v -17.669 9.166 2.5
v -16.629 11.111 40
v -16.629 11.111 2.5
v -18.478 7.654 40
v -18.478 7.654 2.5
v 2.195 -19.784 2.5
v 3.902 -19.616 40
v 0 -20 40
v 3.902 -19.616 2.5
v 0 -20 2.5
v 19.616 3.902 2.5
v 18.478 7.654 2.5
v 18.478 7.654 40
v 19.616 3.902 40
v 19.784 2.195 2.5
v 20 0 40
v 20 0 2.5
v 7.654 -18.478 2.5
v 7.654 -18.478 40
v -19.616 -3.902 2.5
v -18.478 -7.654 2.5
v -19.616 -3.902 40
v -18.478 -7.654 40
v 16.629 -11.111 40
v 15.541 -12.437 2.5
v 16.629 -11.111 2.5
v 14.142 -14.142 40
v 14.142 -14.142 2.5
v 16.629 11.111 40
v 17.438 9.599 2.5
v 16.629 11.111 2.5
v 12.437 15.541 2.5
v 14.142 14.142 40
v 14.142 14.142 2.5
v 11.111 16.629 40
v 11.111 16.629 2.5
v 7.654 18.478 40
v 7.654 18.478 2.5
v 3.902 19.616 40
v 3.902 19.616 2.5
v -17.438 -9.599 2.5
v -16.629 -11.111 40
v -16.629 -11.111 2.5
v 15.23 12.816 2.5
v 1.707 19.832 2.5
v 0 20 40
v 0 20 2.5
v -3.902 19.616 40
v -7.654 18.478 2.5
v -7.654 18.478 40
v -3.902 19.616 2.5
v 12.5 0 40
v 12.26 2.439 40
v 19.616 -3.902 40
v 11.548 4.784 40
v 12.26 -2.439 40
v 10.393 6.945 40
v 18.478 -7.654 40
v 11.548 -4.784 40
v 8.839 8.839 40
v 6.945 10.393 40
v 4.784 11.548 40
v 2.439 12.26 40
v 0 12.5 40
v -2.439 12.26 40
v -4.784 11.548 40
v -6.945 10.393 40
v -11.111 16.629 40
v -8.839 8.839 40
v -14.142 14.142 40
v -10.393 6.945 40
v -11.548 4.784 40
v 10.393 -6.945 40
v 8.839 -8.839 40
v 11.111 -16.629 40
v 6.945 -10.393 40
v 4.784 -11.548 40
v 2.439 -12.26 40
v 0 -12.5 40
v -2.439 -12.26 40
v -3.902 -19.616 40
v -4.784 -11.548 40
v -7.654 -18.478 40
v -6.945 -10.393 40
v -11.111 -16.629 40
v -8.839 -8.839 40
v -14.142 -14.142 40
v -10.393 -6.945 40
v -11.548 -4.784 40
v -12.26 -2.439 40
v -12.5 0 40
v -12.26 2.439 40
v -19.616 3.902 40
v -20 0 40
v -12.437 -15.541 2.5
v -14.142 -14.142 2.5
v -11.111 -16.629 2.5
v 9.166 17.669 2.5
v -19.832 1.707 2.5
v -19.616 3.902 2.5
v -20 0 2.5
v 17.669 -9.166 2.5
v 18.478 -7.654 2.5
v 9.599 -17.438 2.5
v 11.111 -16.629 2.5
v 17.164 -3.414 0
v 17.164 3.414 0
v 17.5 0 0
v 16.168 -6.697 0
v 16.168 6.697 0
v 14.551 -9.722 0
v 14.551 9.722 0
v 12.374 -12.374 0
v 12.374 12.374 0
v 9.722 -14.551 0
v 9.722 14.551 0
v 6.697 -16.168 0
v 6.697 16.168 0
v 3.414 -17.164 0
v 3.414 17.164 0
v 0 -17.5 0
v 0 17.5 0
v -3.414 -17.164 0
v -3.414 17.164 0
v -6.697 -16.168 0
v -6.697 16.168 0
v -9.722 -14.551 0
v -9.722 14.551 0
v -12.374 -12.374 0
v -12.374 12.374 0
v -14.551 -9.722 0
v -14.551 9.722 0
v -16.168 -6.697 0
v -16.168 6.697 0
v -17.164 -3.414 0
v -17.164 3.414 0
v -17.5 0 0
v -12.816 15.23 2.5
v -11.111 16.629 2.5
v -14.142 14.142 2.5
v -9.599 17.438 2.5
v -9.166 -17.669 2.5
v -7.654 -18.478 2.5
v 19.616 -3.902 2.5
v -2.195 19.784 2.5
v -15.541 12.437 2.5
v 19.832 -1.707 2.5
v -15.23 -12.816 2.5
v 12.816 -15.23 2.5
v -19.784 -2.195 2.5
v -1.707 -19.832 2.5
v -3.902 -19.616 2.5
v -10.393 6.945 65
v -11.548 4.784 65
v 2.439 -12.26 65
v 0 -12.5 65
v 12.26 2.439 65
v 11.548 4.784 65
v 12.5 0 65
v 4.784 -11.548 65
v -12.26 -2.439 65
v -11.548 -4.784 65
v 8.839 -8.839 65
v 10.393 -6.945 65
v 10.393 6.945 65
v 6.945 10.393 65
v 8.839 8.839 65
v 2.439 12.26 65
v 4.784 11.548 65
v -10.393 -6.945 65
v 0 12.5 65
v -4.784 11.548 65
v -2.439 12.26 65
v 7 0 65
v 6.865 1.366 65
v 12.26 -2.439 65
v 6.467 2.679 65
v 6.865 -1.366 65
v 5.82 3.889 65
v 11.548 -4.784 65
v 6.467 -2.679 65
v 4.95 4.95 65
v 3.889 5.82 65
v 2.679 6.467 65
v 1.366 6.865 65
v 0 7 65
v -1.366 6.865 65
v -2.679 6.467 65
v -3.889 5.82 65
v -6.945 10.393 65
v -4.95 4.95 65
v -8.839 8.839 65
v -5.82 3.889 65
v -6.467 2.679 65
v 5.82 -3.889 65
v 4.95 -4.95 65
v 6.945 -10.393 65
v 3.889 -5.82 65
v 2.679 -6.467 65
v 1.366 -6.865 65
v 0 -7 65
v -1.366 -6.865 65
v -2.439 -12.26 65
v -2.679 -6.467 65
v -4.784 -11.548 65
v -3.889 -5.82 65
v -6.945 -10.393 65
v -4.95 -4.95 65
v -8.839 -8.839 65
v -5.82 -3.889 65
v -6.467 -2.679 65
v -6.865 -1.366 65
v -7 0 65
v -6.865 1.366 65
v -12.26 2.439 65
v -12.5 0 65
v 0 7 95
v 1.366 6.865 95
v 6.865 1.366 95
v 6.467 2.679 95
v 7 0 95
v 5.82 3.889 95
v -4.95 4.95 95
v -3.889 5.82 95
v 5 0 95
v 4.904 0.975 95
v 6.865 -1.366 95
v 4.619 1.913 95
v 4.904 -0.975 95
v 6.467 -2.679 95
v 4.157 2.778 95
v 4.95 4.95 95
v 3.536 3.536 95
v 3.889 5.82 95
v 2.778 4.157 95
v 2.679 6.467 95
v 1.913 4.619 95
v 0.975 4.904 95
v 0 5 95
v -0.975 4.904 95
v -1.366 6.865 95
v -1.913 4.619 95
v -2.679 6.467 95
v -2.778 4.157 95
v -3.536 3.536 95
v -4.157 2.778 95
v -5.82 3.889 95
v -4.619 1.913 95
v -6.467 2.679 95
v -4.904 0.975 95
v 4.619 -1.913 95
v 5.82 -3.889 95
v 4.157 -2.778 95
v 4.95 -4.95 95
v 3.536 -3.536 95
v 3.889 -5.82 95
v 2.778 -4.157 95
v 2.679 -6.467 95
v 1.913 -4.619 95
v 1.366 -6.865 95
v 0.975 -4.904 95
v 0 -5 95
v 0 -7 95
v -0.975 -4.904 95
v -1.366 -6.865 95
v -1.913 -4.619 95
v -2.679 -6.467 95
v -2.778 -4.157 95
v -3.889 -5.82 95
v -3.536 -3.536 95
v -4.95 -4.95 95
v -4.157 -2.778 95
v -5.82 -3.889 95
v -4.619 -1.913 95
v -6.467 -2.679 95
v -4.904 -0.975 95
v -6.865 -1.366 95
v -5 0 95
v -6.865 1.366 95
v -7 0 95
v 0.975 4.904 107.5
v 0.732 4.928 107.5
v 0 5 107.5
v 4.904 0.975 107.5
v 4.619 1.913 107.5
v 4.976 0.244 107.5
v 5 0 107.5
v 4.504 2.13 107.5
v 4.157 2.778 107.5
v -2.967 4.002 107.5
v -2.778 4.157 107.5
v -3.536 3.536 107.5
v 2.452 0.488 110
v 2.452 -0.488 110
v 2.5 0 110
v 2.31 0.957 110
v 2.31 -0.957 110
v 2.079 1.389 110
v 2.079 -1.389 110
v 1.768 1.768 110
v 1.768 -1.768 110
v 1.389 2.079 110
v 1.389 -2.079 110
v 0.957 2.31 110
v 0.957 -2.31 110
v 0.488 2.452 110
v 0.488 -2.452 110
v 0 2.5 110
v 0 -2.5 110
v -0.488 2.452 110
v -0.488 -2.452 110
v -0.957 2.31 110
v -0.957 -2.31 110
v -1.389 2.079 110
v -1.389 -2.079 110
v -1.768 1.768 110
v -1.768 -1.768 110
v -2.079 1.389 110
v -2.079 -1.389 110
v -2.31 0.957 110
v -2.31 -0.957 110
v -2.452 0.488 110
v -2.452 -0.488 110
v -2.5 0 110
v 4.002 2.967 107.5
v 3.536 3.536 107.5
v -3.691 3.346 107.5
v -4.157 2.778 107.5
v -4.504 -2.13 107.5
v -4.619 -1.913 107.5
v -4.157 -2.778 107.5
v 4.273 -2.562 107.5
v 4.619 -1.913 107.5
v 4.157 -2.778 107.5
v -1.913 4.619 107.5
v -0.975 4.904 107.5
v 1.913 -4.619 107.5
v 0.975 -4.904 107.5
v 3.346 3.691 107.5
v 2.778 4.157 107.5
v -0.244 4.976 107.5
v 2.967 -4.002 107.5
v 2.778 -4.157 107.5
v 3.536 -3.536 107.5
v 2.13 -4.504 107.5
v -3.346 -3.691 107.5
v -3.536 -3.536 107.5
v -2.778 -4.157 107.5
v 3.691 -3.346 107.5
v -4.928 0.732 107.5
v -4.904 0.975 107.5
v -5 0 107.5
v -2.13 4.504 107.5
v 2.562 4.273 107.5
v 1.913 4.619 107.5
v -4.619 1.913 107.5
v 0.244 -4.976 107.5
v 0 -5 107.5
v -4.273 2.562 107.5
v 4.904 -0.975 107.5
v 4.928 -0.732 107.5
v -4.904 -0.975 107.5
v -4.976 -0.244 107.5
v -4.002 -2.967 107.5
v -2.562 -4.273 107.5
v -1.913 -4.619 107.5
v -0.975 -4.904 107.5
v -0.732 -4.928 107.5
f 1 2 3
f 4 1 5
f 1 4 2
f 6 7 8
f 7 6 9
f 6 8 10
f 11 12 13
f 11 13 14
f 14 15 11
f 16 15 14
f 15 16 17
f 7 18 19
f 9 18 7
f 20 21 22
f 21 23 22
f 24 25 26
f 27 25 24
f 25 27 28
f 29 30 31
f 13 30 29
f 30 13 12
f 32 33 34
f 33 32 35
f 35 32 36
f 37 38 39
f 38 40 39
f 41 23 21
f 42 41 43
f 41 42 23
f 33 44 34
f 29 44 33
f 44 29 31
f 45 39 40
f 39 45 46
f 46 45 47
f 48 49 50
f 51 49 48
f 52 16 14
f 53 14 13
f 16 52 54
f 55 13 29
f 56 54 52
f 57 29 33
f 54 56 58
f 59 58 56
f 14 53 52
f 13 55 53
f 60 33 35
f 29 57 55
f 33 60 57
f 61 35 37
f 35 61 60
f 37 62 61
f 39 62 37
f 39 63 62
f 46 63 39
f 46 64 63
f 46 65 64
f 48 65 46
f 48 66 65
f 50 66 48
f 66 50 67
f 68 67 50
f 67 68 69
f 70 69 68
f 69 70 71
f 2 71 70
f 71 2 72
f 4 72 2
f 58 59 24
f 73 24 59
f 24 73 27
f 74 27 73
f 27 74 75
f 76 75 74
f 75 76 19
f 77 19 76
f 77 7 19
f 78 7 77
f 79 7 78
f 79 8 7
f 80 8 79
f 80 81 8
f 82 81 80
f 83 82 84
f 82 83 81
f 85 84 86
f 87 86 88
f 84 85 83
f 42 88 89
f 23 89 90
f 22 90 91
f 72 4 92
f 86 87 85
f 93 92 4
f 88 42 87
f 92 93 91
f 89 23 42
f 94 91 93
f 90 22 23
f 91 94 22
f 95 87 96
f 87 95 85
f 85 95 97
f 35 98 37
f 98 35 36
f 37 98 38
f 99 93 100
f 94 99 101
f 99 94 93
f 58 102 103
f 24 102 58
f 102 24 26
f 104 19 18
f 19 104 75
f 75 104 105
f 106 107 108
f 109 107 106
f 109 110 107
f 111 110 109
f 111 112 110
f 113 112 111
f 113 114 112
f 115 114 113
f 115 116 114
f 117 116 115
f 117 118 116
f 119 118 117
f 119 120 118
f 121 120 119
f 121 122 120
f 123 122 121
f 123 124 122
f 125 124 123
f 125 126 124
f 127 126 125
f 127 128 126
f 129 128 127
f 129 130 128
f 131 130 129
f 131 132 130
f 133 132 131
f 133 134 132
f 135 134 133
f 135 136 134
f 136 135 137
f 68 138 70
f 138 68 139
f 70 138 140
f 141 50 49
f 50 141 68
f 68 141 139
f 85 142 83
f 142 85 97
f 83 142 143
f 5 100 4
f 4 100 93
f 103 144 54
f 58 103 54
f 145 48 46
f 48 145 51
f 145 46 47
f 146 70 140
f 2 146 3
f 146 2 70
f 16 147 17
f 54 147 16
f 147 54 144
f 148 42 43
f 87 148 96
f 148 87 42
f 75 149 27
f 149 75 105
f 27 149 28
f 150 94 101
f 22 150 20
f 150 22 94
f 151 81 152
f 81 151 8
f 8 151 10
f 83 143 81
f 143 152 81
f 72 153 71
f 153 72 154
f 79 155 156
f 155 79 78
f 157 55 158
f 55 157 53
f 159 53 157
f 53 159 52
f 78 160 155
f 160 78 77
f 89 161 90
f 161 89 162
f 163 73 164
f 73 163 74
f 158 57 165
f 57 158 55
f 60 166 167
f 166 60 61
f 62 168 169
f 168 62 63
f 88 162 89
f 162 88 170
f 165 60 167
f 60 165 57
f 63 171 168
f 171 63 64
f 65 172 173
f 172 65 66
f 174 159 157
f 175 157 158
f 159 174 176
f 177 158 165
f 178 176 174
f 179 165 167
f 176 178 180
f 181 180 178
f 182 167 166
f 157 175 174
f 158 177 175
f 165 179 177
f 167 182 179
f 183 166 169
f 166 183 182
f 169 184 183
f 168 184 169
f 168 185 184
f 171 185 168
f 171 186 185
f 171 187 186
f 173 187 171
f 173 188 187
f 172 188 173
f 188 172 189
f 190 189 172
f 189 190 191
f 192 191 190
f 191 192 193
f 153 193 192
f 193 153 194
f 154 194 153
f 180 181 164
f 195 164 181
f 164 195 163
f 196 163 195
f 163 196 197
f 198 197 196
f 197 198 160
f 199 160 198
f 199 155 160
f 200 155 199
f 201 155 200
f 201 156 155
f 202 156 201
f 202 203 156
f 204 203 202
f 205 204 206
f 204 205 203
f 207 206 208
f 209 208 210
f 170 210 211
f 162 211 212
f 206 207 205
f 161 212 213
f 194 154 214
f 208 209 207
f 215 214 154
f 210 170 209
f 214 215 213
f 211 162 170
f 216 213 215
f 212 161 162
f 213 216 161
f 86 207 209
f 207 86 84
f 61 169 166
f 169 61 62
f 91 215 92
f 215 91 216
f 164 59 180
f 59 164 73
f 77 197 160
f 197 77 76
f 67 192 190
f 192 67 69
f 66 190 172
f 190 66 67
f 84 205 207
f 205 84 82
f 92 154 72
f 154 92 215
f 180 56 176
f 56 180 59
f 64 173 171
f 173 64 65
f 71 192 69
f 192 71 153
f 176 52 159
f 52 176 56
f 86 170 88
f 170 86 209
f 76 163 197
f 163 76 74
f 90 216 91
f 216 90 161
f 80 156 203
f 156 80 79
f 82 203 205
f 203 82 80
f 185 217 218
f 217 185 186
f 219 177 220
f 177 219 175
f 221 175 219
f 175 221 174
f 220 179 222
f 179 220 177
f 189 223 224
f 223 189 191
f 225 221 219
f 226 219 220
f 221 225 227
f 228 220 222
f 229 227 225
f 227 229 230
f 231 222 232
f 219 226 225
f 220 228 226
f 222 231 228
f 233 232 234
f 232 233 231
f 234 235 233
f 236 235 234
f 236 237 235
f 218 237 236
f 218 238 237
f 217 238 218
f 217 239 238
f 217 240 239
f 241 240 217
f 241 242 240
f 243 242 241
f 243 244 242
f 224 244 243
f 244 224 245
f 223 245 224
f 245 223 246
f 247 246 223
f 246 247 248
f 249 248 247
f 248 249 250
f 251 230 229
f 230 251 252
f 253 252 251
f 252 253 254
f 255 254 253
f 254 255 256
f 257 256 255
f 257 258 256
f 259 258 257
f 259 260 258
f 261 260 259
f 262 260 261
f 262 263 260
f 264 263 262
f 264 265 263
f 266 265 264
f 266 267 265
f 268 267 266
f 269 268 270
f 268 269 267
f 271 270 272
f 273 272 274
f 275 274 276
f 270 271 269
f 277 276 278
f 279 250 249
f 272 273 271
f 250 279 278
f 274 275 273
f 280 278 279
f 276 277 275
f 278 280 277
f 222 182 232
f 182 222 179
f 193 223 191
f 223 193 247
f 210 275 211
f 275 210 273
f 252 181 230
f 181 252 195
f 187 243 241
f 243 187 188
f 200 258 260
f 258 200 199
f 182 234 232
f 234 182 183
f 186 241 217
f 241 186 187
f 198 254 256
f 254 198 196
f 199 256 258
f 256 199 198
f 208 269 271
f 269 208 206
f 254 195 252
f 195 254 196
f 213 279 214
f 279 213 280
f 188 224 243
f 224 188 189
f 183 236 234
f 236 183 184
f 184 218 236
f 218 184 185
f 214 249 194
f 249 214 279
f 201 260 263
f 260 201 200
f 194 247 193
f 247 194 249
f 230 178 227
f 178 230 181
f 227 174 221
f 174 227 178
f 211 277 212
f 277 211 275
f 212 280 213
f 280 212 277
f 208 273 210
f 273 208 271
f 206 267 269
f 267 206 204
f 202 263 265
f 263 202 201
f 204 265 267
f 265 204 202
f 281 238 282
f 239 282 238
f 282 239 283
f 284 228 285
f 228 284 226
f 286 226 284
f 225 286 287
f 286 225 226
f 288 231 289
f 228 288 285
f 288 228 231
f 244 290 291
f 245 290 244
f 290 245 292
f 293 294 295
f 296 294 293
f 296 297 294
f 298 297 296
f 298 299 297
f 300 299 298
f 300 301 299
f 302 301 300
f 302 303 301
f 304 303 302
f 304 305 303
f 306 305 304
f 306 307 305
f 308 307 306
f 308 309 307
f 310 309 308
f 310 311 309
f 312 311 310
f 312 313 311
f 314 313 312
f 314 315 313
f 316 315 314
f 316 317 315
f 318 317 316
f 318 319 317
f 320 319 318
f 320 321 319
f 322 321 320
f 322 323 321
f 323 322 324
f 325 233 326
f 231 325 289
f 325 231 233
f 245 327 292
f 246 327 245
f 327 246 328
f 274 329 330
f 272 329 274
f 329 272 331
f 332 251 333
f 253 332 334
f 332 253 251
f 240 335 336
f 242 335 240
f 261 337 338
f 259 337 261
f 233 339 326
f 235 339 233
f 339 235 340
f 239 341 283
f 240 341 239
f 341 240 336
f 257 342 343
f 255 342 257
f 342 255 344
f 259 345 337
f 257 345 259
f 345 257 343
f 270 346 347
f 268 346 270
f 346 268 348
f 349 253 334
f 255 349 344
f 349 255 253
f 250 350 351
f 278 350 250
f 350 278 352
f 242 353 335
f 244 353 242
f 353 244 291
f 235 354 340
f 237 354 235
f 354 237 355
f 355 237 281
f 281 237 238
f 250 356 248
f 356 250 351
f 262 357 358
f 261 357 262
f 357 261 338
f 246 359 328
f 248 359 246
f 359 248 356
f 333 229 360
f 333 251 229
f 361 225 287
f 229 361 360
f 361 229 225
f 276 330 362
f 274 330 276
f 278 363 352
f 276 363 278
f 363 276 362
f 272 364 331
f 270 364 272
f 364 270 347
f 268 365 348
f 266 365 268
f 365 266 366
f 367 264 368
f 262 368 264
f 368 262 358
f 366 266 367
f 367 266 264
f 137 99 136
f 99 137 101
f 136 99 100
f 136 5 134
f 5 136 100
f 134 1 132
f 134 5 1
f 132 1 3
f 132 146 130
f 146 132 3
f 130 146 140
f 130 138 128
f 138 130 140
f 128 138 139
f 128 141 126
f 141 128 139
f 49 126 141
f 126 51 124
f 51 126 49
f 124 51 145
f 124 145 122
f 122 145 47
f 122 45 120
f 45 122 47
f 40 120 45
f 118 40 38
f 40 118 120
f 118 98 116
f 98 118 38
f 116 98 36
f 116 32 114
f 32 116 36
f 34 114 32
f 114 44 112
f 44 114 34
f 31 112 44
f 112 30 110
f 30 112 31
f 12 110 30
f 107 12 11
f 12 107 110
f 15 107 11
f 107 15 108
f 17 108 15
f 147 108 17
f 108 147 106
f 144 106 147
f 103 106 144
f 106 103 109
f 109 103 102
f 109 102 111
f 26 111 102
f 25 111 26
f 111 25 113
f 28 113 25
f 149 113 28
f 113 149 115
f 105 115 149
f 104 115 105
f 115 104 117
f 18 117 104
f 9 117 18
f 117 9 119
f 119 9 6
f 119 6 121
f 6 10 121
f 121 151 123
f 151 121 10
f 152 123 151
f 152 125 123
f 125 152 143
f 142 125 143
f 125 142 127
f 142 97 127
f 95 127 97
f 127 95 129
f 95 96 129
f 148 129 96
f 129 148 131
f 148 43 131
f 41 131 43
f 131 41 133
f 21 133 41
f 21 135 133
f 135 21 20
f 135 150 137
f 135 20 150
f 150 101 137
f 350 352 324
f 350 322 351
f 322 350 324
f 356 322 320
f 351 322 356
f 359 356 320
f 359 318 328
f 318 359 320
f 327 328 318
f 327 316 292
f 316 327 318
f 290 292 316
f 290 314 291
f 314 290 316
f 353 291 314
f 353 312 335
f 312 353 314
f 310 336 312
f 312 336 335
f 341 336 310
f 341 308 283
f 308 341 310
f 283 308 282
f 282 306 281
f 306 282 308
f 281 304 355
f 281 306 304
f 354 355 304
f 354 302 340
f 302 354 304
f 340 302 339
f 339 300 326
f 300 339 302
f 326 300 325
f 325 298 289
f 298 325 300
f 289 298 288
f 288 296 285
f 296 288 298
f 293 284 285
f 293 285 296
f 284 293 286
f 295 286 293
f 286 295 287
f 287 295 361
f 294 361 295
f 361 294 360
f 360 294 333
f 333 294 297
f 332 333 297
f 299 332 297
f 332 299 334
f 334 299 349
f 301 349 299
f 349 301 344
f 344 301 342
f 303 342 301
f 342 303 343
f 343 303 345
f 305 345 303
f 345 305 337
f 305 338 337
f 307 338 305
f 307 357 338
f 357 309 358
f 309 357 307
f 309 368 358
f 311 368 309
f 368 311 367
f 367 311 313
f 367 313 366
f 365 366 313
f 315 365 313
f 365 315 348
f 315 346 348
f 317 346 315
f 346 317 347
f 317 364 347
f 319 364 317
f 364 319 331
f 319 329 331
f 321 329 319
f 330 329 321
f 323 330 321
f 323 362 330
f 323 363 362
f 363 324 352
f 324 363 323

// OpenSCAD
$fn = 32;

// ----------------------------------------------------------------------
// Stepped shaft: diameters 40, 25, 14, 10 mm, 110 mm long
// ----------------------------------------------------------------------

// --- parameters (mm) ---
d1 = 40;                  // step 1 diameter
len1 = 40;                // step 1 length
d2 = 25;                  // step 2 diameter
len2 = 25;                // step 2 length
d3 = 14;                  // step 3 diameter
len3 = 30;                // step 3 length
d4 = 10;                  // step 4 diameter
len4 = 15;                // step 4 length
total = 110;              // overall length
chamfer = 2.5;            // end chamfer

difference() {
  /* turned body: stacked cylinders, every step sunk into the bigger one */
  union() {
    cylinder(h = len1, d = d1);
    translate([0, 0, 39.6]) cylinder(h = 25.4, d = d2);
    translate([0, 0, 64.6]) cylinder(h = 30.4, d = d3);
    translate([0, 0, 94.6]) cylinder(h = 15.4, d = d4);
  }
  /* bottom chamfer ring cut */
  rotate_extrude() translate([17.5, -2.5]) polygon([[0, 0], [5, 0], [5, 7.5], [0, 2.5]]);
  /* top chamfer ring cut */
  rotate_extrude() translate([2.5, 110]) polygon([[0, 0], [5, -5], [5, 2.5], [0, 2.5]]);
}
